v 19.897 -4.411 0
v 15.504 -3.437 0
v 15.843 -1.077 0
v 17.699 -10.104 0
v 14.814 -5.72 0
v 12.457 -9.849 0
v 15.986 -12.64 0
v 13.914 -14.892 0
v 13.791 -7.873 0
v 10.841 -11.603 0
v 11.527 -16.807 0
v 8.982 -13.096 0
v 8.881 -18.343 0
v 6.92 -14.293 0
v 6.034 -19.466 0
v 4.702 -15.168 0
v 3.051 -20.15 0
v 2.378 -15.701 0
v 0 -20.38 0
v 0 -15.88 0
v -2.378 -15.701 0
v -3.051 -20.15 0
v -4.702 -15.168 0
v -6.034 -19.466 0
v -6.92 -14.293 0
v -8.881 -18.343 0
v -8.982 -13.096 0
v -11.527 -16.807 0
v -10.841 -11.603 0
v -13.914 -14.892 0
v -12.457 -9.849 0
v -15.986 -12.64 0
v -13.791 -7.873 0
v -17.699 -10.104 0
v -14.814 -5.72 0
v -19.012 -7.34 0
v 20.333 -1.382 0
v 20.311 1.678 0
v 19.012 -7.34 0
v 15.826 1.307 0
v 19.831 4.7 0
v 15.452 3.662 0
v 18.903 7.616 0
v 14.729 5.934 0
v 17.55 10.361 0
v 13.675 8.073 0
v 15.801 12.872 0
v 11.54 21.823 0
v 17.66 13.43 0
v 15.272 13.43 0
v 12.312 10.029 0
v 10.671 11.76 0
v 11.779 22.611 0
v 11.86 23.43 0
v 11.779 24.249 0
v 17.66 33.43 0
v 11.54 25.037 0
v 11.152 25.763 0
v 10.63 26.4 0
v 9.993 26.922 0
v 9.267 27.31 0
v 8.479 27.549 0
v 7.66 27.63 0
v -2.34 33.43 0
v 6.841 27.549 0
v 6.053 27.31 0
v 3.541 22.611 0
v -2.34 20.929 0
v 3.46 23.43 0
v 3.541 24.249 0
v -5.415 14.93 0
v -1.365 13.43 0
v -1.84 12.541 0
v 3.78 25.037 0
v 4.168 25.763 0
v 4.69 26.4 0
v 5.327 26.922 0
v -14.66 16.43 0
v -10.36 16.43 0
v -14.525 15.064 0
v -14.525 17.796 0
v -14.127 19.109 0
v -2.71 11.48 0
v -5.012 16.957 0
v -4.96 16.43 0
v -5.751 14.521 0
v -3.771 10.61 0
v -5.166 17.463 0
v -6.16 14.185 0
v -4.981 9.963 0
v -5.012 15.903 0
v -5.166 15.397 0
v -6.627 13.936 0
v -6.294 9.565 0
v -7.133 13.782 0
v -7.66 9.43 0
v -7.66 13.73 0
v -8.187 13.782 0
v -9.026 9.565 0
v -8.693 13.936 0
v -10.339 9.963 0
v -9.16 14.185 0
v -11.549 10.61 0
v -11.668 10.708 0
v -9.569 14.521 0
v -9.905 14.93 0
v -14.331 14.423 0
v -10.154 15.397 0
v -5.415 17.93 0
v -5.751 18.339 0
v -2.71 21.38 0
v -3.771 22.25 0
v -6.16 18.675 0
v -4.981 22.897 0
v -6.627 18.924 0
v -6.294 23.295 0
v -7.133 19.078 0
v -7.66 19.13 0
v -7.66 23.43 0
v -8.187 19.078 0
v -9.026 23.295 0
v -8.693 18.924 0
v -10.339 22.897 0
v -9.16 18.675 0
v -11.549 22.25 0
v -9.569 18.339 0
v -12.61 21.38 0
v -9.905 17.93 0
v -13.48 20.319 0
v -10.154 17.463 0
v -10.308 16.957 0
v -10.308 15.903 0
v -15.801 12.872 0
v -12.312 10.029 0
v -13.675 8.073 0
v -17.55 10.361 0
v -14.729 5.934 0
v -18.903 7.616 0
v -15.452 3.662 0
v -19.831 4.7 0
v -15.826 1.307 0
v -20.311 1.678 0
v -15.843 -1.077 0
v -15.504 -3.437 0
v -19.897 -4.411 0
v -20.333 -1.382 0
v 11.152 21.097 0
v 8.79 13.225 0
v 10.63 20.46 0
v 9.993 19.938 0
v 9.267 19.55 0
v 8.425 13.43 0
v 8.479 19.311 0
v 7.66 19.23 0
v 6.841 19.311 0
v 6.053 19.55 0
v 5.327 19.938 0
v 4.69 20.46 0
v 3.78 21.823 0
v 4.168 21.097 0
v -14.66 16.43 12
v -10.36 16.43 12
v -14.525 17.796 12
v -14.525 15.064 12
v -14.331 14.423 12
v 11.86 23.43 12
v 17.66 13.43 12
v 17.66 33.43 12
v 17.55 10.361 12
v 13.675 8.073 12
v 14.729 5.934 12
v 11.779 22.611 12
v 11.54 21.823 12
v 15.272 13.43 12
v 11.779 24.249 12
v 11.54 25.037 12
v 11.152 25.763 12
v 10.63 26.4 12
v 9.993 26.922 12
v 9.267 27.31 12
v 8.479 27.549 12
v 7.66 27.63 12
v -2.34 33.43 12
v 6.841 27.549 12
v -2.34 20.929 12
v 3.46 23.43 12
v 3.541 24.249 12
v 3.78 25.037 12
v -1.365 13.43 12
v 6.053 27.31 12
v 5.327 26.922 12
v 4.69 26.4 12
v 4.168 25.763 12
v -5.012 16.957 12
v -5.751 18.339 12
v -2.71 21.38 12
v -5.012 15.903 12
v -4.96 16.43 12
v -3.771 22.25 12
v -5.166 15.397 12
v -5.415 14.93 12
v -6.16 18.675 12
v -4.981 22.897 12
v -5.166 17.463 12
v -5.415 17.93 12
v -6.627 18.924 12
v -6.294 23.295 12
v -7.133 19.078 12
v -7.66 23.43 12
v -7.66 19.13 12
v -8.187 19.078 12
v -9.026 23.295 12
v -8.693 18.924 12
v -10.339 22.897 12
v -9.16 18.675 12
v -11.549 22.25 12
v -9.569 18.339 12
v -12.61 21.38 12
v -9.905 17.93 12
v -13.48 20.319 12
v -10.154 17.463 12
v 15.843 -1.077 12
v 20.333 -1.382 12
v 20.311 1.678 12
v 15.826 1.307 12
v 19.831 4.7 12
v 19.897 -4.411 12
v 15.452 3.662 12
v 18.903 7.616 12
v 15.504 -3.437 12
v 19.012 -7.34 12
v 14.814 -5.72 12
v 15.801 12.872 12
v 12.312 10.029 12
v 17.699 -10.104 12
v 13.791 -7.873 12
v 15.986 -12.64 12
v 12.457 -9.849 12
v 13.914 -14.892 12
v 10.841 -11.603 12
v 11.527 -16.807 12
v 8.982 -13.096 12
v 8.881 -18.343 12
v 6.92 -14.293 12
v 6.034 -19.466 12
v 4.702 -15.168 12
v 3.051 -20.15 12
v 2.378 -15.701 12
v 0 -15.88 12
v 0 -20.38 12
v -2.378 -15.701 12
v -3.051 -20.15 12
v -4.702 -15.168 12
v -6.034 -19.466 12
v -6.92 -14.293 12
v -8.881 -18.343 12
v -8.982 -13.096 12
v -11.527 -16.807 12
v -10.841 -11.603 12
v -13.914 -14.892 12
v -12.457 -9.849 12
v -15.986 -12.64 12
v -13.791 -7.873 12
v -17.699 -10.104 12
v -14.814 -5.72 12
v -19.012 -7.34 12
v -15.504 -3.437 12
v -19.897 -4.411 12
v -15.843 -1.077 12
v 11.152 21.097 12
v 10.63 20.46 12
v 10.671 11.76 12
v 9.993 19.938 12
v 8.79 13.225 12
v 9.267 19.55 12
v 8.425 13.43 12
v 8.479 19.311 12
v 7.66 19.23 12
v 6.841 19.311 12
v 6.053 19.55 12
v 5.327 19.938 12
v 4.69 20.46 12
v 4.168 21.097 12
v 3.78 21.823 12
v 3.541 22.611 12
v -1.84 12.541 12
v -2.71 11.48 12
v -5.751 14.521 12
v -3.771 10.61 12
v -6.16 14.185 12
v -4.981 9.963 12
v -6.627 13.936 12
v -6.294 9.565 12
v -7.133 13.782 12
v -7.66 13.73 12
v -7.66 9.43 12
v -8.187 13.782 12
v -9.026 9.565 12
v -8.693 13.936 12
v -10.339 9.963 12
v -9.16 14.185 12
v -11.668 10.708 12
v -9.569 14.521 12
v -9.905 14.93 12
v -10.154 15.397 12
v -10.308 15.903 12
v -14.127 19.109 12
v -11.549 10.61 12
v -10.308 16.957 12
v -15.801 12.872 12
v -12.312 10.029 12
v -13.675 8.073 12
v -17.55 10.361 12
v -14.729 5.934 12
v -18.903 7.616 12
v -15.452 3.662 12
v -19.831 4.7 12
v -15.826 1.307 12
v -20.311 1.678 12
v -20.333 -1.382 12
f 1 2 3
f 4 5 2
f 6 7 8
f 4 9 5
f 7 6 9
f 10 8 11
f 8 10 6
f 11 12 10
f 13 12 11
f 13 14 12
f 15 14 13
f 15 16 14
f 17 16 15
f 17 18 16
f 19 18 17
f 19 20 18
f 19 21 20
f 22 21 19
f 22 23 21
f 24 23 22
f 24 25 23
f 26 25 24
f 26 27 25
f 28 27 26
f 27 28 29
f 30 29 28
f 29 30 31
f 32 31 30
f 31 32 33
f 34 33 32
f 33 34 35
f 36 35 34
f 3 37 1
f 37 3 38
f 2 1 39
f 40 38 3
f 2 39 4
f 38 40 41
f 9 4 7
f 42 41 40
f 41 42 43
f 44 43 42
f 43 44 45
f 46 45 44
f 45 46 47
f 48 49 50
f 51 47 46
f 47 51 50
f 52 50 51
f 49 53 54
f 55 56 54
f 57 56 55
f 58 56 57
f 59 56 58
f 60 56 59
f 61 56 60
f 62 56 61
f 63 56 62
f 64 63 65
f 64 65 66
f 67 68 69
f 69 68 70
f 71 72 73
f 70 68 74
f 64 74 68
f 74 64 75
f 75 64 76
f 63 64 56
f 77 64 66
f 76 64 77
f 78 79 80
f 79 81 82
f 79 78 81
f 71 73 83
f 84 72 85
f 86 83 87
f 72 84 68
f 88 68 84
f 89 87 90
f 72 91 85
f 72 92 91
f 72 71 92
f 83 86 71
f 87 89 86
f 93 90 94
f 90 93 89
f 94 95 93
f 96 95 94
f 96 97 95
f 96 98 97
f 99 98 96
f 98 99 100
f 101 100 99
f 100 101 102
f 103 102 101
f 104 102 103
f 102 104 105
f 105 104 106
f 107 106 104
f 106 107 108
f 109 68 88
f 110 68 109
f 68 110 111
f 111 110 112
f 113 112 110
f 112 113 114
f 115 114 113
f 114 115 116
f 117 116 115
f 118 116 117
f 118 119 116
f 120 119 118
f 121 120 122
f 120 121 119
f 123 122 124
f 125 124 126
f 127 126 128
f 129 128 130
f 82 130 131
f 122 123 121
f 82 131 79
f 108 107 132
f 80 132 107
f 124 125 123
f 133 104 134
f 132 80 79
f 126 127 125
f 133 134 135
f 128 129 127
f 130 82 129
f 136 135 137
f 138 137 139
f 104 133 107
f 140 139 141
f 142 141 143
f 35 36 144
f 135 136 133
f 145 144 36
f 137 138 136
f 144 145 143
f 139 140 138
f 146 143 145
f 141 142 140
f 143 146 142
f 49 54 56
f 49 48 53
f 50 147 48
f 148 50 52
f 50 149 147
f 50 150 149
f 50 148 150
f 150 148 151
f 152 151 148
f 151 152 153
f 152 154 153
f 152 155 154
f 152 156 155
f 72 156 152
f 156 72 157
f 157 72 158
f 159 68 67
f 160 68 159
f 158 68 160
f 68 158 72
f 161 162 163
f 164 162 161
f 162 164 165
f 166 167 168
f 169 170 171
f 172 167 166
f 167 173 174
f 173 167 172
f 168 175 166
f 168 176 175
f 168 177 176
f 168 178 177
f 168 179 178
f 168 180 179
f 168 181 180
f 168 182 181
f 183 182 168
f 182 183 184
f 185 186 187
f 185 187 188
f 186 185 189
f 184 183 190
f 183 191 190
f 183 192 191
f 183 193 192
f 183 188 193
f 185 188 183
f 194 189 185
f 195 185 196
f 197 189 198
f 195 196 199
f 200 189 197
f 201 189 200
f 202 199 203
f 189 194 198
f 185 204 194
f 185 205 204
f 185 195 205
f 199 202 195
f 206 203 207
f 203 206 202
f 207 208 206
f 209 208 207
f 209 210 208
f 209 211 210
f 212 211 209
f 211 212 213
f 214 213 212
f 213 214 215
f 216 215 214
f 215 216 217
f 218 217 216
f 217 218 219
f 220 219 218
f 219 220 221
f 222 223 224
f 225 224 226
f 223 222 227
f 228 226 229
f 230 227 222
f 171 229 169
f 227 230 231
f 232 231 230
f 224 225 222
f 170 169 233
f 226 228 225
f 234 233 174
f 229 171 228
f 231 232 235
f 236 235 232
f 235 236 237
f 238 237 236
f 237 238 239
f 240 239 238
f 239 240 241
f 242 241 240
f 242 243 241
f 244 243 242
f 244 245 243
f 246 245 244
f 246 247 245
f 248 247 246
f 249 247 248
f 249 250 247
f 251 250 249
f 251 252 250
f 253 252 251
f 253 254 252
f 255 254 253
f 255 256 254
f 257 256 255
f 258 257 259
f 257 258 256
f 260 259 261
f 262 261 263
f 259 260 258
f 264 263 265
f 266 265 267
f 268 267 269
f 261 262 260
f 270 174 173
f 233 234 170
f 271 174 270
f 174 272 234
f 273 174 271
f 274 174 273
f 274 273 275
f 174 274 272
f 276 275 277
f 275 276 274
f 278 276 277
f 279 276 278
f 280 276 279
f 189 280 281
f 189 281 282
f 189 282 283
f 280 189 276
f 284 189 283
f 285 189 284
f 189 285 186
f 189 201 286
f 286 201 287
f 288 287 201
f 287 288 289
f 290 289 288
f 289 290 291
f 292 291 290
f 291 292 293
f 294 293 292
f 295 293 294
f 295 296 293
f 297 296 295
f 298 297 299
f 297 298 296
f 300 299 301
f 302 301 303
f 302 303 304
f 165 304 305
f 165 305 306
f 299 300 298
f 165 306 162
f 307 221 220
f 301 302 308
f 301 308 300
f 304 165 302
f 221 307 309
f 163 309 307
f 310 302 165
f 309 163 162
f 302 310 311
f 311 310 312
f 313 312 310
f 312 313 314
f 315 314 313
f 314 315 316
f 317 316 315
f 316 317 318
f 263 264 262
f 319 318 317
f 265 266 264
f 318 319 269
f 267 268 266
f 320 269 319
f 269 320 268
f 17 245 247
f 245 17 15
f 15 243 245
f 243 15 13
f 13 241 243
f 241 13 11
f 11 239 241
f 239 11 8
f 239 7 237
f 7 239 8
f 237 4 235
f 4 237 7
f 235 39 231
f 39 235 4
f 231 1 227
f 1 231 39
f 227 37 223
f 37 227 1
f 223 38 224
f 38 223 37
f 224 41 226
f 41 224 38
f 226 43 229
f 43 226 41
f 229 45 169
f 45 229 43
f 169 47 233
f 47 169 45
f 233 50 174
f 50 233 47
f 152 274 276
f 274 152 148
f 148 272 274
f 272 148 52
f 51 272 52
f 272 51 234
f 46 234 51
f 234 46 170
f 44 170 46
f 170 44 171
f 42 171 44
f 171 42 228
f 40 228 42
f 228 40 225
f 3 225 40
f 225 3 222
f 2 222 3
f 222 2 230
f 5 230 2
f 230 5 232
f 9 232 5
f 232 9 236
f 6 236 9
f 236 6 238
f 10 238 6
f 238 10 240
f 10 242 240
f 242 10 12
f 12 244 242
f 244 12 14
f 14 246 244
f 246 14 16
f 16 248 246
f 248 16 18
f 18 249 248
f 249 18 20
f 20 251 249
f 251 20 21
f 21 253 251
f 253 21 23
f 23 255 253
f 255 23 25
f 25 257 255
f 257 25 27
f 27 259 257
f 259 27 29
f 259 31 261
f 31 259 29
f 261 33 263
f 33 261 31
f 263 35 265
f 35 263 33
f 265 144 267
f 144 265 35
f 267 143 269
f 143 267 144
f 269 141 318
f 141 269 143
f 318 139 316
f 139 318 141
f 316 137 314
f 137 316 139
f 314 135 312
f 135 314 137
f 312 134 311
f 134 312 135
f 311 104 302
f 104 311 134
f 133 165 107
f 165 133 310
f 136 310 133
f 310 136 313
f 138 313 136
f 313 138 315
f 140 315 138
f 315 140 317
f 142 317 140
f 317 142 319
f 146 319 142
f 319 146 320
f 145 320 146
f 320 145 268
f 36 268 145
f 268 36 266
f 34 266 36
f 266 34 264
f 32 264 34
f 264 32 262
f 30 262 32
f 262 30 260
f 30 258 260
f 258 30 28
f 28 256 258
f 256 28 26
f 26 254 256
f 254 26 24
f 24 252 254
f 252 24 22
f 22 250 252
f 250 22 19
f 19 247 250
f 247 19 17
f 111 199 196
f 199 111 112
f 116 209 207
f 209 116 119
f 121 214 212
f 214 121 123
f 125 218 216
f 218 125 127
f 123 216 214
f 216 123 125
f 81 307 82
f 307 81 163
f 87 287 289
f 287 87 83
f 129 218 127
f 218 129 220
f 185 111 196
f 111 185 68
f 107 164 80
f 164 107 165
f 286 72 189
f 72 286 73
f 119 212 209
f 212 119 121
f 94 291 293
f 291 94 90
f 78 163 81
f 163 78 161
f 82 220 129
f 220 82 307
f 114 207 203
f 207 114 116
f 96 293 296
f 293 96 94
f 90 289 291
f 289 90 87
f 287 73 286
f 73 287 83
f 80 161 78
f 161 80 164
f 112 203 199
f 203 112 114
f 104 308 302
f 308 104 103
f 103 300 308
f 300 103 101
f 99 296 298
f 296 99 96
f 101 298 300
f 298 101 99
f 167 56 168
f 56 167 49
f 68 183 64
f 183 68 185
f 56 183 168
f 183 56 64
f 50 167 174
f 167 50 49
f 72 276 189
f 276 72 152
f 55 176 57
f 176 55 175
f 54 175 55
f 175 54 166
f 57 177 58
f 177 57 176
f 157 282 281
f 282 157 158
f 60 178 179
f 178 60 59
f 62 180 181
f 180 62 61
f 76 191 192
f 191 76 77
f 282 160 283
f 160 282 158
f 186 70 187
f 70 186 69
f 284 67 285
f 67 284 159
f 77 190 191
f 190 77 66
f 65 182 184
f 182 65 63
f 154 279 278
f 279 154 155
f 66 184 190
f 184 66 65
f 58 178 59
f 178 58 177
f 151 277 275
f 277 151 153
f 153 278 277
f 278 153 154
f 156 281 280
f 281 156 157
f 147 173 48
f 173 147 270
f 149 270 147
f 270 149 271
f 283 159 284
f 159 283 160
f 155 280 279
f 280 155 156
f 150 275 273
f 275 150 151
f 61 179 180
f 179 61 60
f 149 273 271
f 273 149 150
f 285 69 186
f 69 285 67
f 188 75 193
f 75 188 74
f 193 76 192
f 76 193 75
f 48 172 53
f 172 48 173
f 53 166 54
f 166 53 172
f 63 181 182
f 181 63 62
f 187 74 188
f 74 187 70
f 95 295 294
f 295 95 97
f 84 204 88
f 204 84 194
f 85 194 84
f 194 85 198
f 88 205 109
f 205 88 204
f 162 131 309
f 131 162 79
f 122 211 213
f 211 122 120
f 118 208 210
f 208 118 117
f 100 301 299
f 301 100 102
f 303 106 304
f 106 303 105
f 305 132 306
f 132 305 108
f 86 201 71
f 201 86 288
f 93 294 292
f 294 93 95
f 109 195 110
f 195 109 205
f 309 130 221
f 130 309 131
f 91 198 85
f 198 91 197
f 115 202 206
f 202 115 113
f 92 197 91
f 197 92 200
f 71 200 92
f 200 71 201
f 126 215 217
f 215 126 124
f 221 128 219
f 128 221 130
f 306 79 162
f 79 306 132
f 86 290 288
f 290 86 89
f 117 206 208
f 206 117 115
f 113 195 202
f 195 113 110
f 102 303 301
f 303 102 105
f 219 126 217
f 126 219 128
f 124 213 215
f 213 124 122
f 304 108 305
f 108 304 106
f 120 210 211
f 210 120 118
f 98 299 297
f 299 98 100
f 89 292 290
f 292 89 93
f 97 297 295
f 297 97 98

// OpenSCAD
$fn = 32;

// ----------------------------------------------------------------------
// Pipe clamp: 40.76 mm ring, 4.5 mm wall, 12 mm wide
// ----------------------------------------------------------------------

// --- parameters (mm) ---
outer_r = 20.38;          // clamp outside radius
inner_r = 15.88;          // pipe bore radius
band = 4.5;               // band thickness
clamp_w = 12;             // clamp width
opening = 50;             // opening angle between the ends
lug_w = 20;               // lug width
lug_len = 20;             // lug length
bolt_d = 8.4;             // bolt hole
knuckle_d = 14;           // hinge knuckle diameter
pin_d = 5.4;              // hinge pin hole

clamp_profile = [[-8.613, 18.471], [-11.281, 16.973], [-13.696, 15.092], [-15.801, 12.872], [-17.55, 10.361], [-18.903, 7.616], [-19.831, 4.7], [-20.311, 1.678], [-20.333, -1.382], [-19.897, -4.411], [-19.012, -7.34], [-17.699, -10.104], [-15.986, -12.64], [-13.914, -14.892], [-11.527, -16.807], [-8.881, -18.343], [-6.034, -19.466], [-3.051, -20.15], [0, -20.38], [3.051, -20.15], [6.034, -19.466], [8.881, -18.343], [11.527, -16.807], [13.914, -14.892], [15.986, -12.64], [17.699, -10.104], [19.012, -7.34], [19.897, -4.411], [20.333, -1.382], [20.311, 1.678], [19.831, 4.7], [18.903, 7.616], [17.55, 10.361], [15.801, 12.872], [13.696, 15.092], [11.281, 16.973], [8.613, 18.471], [6.711, 14.392], [8.79, 13.225], [10.671, 11.76], [12.312, 10.029], [13.675, 8.073], [14.729, 5.934], [15.452, 3.662], [15.826, 1.307], [15.843, -1.077], [15.504, -3.437], [14.814, -5.72], [13.791, -7.873], [12.457, -9.849], [10.841, -11.603], [8.982, -13.096], [6.92, -14.293], [4.702, -15.168], [2.378, -15.701], [0, -15.88], [-2.378, -15.701], [-4.702, -15.168], [-6.92, -14.293], [-8.982, -13.096], [-10.841, -11.603], [-12.457, -9.849], [-13.791, -7.873], [-14.814, -5.72], [-15.504, -3.437], [-15.843, -1.077], [-15.826, 1.307], [-15.452, 3.662], [-14.729, 5.934], [-13.675, 8.073], [-12.312, 10.029], [-10.671, 11.76], [-8.79, 13.225], [-6.711, 14.392]];

difference() {
  union() {
    linear_extrude(height = clamp_w) polygon(clamp_profile);
    /* hinge knuckle, sunk 2 mm into the band end */
    translate([-7.66, 16.43, 0]) cylinder(h = clamp_w, d = knuckle_d);
    /* bolt lug on the other end */
    translate([-2.34, 13.43, 0]) cube([lug_w, 20, clamp_w]);
  }
  translate([7.66, 23.43, -2.5]) cylinder(h = clamp_w + 5, d = bolt_d);
  translate([-7.66, 16.43, -2.5]) cylinder(h = clamp_w + 5, d = pin_d);
}
